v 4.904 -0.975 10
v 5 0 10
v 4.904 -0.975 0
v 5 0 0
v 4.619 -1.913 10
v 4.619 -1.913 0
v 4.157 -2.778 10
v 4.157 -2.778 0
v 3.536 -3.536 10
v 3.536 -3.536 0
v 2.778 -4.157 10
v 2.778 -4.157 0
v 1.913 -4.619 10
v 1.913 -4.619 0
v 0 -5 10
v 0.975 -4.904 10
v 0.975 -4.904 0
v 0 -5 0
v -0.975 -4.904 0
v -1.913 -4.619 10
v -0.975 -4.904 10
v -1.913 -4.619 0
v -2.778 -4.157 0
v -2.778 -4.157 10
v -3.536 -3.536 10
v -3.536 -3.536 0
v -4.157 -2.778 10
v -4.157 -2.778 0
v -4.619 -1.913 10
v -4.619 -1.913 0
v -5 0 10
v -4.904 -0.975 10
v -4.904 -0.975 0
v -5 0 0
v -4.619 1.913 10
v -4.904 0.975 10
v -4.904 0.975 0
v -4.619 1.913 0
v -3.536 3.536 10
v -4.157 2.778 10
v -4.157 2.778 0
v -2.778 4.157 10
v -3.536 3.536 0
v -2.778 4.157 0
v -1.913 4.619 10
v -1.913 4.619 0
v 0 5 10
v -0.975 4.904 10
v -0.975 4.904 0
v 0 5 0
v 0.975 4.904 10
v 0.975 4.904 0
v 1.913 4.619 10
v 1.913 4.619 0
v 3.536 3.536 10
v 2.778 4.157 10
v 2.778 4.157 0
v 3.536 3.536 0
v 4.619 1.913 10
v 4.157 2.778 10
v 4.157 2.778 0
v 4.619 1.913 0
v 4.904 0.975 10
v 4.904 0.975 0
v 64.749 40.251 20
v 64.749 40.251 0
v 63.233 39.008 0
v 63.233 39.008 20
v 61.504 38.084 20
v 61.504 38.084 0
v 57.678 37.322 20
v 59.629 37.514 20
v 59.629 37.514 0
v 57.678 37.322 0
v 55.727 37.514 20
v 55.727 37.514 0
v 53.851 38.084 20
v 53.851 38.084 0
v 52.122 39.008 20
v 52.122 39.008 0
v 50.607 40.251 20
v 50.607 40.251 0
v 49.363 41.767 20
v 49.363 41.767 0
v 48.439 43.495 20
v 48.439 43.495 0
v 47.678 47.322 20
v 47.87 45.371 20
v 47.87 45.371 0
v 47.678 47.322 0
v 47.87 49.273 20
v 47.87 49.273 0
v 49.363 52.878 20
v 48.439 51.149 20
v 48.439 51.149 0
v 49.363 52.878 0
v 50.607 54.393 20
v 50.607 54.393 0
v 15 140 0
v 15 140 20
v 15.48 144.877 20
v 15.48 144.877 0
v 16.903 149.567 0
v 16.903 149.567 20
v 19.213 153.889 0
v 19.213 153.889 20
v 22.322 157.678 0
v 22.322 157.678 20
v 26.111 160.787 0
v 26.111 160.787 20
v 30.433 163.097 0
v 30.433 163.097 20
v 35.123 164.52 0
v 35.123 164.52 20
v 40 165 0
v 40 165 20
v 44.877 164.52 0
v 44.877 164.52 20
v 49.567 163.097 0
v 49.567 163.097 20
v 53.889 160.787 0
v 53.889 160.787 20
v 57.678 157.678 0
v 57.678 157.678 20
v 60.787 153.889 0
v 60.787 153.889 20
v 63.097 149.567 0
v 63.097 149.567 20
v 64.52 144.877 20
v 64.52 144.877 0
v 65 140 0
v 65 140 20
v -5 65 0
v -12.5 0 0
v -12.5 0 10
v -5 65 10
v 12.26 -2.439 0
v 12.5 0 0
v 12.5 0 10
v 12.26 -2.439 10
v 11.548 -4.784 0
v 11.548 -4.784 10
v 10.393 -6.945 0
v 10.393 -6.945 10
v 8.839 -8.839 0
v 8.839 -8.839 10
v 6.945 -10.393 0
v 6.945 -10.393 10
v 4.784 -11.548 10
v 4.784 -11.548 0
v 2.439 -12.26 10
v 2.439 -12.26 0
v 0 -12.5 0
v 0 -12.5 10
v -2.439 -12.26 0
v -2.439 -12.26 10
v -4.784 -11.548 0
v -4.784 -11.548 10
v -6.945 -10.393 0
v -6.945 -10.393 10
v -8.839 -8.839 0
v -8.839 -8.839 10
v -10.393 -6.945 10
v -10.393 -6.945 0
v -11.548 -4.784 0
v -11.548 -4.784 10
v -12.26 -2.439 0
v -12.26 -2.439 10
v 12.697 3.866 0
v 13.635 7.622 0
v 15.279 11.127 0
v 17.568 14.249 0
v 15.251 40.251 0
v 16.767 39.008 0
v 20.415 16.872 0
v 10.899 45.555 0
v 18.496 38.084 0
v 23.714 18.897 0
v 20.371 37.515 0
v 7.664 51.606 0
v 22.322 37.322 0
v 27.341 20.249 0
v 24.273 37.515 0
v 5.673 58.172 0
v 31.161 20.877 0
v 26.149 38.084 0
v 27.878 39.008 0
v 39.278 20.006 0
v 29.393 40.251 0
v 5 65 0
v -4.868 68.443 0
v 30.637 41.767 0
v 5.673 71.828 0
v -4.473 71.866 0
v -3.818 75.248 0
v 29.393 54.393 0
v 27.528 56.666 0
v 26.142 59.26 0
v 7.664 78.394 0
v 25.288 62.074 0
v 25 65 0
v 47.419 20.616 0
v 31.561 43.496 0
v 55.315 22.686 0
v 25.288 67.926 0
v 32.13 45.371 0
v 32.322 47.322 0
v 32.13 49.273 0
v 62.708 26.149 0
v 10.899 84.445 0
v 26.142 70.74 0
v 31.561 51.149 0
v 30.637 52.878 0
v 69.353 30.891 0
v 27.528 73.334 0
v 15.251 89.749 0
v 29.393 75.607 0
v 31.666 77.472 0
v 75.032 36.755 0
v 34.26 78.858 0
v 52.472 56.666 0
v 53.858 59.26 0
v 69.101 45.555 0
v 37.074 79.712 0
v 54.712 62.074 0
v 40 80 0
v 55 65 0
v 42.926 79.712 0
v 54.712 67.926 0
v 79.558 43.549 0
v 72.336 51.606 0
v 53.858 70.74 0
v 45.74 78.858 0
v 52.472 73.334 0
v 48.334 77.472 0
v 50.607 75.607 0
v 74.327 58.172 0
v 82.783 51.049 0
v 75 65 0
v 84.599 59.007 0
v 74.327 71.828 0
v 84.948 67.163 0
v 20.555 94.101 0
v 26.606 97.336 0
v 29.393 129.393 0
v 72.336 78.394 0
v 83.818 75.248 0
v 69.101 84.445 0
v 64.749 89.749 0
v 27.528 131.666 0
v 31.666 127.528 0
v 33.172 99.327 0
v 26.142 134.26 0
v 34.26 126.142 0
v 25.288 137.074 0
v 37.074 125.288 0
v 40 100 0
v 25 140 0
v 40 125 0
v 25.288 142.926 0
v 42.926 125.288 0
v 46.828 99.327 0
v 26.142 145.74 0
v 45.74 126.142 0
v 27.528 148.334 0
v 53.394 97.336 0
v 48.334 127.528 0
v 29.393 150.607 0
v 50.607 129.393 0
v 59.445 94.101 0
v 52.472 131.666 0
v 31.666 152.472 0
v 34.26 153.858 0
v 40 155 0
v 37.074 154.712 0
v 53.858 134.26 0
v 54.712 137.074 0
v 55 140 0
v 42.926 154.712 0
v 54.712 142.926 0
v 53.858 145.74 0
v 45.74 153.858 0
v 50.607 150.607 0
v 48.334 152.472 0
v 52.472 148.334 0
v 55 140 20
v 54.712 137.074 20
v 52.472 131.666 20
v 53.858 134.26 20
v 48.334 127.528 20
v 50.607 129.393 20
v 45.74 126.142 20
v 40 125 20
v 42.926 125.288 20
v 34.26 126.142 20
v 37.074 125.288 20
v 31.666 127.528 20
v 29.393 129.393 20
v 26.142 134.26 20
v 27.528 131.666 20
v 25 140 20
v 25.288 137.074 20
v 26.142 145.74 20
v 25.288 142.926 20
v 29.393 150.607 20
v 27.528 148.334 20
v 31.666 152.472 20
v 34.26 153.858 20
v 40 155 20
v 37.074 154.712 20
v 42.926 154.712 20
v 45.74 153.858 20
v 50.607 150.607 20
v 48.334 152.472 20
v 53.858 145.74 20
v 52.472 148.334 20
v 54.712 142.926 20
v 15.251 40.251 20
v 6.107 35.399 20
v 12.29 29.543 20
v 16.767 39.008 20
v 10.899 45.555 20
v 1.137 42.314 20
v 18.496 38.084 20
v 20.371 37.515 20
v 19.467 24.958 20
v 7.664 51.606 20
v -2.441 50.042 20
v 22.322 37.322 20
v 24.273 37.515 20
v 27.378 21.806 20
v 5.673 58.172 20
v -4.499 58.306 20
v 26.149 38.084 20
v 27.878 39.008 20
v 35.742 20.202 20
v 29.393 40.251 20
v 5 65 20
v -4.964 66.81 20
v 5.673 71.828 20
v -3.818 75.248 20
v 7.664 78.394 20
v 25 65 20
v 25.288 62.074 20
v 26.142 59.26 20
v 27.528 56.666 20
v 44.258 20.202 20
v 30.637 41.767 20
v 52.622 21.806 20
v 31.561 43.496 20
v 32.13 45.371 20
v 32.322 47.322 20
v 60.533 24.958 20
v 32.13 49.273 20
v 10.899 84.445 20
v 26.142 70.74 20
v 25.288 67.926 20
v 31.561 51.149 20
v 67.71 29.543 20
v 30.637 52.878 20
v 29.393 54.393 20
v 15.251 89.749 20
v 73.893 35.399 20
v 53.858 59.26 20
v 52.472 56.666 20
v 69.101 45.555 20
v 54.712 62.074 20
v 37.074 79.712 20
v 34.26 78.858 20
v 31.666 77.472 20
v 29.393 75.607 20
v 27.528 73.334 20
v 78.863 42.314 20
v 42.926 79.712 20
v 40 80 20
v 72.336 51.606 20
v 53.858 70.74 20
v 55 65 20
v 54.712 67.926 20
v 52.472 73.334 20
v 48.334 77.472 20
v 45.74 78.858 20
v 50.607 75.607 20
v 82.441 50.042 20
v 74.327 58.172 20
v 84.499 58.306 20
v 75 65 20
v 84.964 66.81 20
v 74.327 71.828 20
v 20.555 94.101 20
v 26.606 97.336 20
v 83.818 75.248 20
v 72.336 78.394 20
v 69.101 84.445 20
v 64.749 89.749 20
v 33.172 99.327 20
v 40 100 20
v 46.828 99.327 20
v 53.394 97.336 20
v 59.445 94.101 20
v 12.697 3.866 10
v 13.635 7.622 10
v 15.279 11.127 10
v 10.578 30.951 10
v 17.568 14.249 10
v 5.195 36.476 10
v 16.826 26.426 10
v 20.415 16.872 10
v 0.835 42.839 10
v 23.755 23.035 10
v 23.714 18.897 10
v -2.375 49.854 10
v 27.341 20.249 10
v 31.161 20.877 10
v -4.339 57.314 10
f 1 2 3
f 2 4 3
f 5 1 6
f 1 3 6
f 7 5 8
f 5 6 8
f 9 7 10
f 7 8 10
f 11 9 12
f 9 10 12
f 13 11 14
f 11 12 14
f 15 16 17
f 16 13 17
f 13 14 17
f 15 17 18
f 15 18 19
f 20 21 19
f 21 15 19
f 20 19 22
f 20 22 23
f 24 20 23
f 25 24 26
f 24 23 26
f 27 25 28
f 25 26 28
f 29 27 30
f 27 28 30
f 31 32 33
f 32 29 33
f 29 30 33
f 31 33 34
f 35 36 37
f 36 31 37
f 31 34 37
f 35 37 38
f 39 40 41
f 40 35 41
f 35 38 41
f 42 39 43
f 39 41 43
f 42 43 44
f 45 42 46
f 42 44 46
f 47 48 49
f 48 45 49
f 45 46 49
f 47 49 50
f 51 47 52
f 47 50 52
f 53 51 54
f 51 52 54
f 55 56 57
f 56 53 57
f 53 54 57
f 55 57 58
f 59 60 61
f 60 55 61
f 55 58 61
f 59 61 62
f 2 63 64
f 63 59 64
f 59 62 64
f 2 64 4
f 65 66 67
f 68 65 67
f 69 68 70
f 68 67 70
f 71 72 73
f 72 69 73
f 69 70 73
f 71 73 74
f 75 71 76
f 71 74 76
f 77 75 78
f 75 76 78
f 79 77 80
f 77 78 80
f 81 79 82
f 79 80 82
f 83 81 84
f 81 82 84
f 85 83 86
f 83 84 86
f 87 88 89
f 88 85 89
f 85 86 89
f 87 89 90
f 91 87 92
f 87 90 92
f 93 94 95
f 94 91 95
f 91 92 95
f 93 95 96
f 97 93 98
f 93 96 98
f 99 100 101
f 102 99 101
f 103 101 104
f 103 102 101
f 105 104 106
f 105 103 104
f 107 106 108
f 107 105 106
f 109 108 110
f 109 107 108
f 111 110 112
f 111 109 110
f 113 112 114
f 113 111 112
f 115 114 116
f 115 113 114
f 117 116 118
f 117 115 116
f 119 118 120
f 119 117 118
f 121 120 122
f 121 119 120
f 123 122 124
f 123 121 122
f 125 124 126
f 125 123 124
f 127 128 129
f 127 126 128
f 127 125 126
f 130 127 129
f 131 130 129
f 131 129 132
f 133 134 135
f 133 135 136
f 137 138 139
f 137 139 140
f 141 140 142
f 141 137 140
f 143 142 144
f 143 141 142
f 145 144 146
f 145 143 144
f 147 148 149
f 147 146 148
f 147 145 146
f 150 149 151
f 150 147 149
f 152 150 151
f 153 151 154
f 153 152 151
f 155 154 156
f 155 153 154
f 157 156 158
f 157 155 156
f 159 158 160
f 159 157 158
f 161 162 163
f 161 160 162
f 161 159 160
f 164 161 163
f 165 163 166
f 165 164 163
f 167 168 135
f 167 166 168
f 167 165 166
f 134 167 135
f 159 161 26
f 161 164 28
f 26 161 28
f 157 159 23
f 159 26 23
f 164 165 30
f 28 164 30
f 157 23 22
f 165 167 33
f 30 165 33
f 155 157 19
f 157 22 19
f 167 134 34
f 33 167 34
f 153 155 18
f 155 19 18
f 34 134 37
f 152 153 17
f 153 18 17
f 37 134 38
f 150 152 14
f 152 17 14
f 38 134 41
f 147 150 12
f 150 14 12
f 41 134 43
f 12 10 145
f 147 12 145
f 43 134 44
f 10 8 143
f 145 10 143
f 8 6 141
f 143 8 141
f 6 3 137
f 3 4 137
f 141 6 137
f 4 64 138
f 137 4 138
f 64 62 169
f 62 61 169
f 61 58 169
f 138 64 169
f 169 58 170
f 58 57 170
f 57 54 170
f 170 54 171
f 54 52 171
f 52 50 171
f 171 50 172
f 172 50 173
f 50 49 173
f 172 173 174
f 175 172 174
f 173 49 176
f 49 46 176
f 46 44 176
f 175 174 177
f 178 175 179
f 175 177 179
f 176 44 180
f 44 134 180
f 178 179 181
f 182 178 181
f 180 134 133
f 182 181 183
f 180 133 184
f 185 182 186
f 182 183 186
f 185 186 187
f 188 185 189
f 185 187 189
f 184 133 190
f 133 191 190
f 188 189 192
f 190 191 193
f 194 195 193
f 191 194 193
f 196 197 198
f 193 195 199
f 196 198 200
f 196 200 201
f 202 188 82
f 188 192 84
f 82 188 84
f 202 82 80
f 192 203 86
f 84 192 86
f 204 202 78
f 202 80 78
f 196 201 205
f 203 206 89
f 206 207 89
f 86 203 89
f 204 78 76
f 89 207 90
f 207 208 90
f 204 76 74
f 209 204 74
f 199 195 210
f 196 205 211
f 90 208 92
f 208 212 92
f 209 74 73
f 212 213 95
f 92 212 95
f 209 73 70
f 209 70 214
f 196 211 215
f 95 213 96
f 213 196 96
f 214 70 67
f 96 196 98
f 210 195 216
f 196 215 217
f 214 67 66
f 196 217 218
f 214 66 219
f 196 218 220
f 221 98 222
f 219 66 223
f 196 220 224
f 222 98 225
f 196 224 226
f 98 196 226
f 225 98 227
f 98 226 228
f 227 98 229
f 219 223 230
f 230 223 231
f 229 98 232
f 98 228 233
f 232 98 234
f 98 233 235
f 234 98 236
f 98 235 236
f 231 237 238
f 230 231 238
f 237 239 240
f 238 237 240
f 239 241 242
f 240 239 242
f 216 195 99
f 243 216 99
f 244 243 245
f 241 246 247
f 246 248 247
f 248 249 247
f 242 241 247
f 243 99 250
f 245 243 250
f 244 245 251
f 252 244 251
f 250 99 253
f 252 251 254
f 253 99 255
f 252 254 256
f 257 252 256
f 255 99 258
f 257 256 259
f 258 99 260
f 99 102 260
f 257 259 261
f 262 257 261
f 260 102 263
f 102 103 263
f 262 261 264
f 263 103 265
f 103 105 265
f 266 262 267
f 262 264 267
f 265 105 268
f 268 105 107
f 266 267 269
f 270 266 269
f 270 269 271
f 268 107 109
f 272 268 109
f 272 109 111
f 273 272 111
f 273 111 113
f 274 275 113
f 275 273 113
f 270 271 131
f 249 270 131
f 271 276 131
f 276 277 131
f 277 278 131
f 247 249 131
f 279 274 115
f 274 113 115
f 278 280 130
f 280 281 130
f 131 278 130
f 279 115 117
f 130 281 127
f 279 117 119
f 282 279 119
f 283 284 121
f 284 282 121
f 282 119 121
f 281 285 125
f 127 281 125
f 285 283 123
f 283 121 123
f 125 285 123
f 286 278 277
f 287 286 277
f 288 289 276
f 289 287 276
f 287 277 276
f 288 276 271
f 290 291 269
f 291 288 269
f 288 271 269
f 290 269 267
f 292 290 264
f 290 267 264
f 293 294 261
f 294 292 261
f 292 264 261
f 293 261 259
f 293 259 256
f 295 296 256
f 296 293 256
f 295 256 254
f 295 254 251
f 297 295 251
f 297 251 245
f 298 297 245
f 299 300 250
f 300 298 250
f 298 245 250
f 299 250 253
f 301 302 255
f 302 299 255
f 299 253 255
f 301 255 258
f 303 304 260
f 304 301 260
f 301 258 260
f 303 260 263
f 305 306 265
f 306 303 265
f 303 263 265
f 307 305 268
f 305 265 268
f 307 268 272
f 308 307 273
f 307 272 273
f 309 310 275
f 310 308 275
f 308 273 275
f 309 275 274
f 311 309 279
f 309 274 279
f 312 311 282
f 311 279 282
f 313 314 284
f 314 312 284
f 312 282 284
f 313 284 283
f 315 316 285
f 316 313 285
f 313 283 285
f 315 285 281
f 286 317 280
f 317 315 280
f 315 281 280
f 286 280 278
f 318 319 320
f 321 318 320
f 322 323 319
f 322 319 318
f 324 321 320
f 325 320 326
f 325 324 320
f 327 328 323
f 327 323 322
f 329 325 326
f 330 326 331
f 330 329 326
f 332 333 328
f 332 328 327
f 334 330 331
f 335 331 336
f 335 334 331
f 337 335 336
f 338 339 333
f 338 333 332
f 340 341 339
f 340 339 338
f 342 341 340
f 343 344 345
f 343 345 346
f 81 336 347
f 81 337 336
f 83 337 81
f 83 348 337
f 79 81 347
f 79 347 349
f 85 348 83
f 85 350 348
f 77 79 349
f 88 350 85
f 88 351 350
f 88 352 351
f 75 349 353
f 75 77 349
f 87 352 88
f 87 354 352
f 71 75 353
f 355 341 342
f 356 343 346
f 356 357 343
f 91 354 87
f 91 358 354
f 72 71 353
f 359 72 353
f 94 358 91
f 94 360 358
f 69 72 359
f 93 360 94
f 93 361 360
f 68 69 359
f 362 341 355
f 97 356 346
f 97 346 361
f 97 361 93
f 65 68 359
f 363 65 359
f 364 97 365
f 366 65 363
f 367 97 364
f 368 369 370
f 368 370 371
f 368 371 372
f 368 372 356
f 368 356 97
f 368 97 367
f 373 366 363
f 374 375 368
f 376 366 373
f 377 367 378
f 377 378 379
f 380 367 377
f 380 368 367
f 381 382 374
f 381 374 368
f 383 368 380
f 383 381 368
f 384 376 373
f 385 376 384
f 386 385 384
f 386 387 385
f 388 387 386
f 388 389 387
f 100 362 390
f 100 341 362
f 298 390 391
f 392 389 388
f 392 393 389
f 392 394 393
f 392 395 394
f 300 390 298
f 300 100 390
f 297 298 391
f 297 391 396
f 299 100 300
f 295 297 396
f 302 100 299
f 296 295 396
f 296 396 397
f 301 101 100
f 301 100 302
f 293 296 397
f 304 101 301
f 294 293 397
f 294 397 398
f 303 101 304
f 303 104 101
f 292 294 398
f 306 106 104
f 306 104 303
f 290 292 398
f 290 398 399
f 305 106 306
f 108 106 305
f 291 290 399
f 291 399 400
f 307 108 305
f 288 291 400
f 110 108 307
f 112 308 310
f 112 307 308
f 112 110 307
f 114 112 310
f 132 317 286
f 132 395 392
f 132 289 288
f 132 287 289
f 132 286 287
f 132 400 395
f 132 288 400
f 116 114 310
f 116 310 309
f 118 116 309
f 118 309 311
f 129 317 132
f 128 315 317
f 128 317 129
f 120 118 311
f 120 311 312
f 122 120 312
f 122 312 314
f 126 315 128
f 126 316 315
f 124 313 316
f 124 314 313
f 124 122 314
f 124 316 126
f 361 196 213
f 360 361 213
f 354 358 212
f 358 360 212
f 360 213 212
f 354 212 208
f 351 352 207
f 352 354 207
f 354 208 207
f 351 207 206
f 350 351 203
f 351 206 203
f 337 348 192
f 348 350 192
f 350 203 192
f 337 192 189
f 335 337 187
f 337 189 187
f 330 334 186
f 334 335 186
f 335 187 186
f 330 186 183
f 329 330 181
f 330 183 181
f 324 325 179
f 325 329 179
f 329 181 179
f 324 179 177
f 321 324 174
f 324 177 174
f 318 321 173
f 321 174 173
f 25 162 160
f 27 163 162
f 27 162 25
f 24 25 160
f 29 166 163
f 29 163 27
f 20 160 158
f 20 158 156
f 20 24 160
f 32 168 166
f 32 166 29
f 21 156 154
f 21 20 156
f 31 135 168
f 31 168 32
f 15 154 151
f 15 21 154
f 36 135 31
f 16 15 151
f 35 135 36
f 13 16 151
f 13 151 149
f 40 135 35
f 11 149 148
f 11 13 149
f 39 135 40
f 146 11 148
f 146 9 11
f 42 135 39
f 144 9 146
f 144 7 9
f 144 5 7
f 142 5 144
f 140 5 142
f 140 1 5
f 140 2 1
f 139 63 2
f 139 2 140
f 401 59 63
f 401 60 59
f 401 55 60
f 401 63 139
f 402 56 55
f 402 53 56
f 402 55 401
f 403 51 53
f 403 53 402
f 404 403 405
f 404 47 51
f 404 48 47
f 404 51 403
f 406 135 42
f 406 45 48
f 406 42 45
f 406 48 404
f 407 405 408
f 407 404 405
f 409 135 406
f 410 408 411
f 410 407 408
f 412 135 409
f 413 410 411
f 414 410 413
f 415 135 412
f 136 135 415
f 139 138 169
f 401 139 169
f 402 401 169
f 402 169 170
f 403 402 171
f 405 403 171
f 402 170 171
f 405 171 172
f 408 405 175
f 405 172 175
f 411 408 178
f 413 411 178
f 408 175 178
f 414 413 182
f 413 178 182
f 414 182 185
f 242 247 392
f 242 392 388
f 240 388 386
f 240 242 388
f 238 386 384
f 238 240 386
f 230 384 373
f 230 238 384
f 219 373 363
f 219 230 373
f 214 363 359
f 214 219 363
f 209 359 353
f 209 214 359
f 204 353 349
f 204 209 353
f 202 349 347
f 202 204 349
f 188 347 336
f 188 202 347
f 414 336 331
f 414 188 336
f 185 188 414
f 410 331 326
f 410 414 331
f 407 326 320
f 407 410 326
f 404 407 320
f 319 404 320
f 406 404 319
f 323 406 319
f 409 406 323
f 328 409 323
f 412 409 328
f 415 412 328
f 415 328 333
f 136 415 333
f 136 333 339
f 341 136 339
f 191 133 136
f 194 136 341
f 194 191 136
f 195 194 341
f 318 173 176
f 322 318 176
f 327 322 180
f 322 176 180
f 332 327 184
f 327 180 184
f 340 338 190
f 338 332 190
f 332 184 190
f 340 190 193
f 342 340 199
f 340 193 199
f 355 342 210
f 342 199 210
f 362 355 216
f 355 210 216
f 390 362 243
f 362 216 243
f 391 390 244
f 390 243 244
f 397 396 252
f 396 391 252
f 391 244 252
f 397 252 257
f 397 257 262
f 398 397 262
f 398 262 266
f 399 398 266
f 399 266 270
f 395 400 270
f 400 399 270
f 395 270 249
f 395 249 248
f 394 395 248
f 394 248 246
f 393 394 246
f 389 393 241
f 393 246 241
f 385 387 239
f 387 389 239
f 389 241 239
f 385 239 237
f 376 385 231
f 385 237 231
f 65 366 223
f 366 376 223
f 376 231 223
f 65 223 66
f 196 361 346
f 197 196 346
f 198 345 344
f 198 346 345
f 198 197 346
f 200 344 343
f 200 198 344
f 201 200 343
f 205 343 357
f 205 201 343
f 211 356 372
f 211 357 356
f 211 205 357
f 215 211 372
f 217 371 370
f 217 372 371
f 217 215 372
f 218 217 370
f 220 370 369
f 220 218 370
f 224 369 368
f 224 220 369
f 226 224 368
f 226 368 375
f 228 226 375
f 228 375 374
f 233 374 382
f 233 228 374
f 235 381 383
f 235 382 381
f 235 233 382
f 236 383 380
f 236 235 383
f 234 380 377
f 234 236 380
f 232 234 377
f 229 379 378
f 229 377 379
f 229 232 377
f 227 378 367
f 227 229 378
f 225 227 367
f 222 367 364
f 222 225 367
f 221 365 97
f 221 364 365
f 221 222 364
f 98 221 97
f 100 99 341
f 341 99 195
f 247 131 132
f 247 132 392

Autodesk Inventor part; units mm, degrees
ref_plane "YZ Plane" through (0, 0, 0) normal (1, 0, 0) x (0, 1, 0)
ref_plane "XZ Plane" through (0, 0, 0) normal (0, 1, 0) x (-1, 0, 0)
ref_plane "XY Plane" through (0, 0, 0) normal (0, 0, 1) x (1, 0, 0)
sketch "Эскиз1" plane through (0, 0, 0) normal (0, 0, 1) x (1, 0, 0)
  circle A0 centre (0, 0) radius 5
  circle A1 centre (0, 0) radius 12.5
  arc A2 (-2.4853, 79.8323) -> (82.4853, 79.8323) centre (40, 65) ccw
  arc A3 (57.6777, 47.3223) -> (22.3223, 47.3223) centre (40, 65) ccw construction
  arc A4 (64.7487, 40.2513) -> (15.2513, 40.2513) centre (40, 65) ccw
  arc A5 (50.6066, 54.3934) -> (29.3934, 54.3934) centre (40, 65) ccw
  arc A6 (50.6066, 54.3934) -> (64.7487, 40.2513) centre (57.6777, 47.3223) ccw
  arc A7 (15.2513, 40.2513) -> (29.3934, 54.3934) centre (22.3223, 47.3223) ccw
  line L0 (40, 65) -> (57.6777, 47.3223) construction
  line L1 (40, 65) -> (65, 65) construction
  line L2 (40, 65) -> (22.3223, 47.3223) construction
  line L3 (-12.5, 0) -> (-5, 65)
  circle A8 centre (40, 140) radius 15
  arc A9 (65, 140) -> (15, 140) centre (40, 140) ccw
  line L4 (15, 140) -> (-3.8175, 75.2482)
  line L5 (65, 140) -> (83.8175, 75.2482)
  arc A10 (31.1612, 20.8766) -> (12.5, 0) centre (32.4788, 0.92) ccw
  dimension "d0" = 10
  dimension "d1" = 25
  dimension "d2" = 90
  dimension "d4" = 25
  dimension "d5" = 45
  dimension "d6" = 90
  dimension "d7" = 20
  dimension "d9" = 30
  dimension "d10" = 50
  dimension "d11" = 20
  dimension "d24" = 73.796
  dimension "d25" = 32.409
  dimension "d26" = 22.786
  dimension "d27" = 101.4868
  dimension "d28" = 65
  dimension "d29" = 74.2462
  dimension "d30" = 24.665
  dimension "d31" = 12.4176
  dimension "d32" = 75
  dimension "d33" = 24.0068
  dimension "d34" = 70.0415
  dimension "d35" = 64.0799
extrude "Выдавливание1" add sketch "Эскиз1" along normal blind 10 contours L3 A1 A10 | L3 A2 A10 A1
extrude "Выдавливание2" add sketch "Эскиз1" along normal blind 20 contours A2 L4 A9 L5
properties part number "LR3_2"
